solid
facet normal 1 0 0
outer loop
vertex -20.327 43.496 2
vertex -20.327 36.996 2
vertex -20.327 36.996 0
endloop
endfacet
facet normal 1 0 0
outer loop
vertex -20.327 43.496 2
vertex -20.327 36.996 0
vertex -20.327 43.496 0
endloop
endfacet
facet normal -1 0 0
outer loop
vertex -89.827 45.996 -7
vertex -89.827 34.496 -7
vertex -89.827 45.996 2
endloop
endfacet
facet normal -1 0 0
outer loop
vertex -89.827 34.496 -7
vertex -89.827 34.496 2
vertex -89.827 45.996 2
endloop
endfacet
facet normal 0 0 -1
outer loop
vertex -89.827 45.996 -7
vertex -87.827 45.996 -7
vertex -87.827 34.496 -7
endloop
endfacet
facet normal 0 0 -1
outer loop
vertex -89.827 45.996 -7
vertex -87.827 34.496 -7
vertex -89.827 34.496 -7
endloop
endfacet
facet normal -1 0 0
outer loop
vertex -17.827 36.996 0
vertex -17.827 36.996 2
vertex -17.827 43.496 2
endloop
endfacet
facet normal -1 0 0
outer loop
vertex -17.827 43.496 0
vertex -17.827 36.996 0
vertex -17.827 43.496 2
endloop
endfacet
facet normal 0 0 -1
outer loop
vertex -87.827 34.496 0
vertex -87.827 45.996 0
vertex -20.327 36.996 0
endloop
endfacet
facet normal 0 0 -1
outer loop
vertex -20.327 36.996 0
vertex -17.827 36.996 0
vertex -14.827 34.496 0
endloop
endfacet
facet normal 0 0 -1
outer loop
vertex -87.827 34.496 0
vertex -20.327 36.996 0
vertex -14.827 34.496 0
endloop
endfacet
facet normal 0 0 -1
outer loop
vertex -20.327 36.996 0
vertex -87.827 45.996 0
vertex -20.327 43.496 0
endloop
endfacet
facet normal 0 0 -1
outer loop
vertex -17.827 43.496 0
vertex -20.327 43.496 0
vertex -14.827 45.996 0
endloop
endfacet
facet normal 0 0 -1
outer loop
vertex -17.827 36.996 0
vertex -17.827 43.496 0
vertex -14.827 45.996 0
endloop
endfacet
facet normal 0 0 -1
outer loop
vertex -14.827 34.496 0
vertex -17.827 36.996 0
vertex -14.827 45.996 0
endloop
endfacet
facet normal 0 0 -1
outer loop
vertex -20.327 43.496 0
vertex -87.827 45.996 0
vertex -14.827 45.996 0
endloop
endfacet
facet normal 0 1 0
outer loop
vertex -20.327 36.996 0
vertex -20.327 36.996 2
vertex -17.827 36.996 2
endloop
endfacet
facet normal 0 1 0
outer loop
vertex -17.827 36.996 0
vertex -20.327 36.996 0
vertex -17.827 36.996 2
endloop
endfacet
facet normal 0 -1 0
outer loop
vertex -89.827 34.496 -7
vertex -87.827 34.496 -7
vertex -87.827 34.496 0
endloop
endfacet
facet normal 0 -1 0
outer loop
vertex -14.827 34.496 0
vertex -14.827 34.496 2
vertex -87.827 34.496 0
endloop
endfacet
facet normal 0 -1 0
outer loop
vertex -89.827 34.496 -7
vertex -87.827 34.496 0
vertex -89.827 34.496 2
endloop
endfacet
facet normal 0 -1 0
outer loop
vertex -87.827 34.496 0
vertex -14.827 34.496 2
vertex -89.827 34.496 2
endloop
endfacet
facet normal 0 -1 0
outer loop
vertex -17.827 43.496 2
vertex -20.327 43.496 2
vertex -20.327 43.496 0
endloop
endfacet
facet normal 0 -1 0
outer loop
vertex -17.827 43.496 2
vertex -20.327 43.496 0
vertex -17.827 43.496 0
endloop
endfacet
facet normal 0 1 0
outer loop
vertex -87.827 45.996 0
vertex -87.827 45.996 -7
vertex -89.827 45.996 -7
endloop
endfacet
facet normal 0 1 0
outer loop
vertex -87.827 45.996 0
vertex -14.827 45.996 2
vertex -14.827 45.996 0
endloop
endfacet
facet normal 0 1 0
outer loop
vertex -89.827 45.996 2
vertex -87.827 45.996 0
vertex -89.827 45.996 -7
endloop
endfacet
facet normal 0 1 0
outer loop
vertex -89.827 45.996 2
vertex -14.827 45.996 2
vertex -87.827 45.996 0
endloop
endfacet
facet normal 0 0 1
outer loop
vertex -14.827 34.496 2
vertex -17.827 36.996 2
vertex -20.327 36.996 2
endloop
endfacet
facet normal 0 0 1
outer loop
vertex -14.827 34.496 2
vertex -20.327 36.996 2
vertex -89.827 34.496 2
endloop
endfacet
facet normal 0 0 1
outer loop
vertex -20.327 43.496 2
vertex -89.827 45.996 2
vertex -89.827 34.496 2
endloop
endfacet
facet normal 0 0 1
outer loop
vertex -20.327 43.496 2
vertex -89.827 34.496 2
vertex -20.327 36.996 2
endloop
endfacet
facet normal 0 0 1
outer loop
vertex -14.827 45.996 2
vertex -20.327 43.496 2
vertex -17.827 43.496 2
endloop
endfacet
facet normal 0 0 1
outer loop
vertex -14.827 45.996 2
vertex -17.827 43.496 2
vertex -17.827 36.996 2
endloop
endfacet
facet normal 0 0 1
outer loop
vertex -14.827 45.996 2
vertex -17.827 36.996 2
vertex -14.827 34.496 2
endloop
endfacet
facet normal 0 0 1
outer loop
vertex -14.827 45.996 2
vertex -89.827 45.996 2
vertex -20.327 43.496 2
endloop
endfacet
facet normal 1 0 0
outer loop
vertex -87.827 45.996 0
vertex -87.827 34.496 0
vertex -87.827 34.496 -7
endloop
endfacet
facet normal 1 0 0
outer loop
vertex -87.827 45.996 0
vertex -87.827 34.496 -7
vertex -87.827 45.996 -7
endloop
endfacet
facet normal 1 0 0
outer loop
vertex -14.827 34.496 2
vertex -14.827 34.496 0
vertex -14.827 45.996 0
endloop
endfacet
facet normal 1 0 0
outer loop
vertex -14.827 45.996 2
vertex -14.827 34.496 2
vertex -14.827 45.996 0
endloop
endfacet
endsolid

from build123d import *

# Parameters (mm, degrees)
SKETCH2_W           = 75
SKETCH2_H           = 11.5
BOSS_EXTRUDE1_DEPTH = 2
SKETCH3_W           = 2
SKETCH3_H           = 11.5
BOSS_EXTRUDE2_DEPTH = 7
SKETCH4_W           = 2.5
SKETCH4_H           = 6.5
CUT_EXTRUDE1_DEPTH  = 10


with BuildPart() as part:
    # Sketch2 → Boss-Extrude1 (new body)
    with BuildSketch(Plane.XY):
        with Locations((-52.326839827, 40.245670996)):
            Rectangle(SKETCH2_W, SKETCH2_H)
    extrude(amount=BOSS_EXTRUDE1_DEPTH)

    # Sketch3 → Boss-Extrude2 (add)
    with BuildSketch(Plane(origin=(0, 0, 0), x_dir=(-1, 0, 0), z_dir=(0, 0, -1))):
        with Locations((88.826839827, 40.245670996)):
            Rectangle(SKETCH3_W, SKETCH3_H)
    extrude(amount=BOSS_EXTRUDE2_DEPTH)

    # Sketch4 → Cut-Extrude1 (cut)
    with BuildSketch(Plane.XY.offset(2)):
        with Locations((-19.076839827, 40.245670996)):
            Rectangle(SKETCH4_W, SKETCH4_H)
    extrude(amount=-CUT_EXTRUDE1_DEPTH, mode=Mode.SUBTRACT)


solid = part.part
